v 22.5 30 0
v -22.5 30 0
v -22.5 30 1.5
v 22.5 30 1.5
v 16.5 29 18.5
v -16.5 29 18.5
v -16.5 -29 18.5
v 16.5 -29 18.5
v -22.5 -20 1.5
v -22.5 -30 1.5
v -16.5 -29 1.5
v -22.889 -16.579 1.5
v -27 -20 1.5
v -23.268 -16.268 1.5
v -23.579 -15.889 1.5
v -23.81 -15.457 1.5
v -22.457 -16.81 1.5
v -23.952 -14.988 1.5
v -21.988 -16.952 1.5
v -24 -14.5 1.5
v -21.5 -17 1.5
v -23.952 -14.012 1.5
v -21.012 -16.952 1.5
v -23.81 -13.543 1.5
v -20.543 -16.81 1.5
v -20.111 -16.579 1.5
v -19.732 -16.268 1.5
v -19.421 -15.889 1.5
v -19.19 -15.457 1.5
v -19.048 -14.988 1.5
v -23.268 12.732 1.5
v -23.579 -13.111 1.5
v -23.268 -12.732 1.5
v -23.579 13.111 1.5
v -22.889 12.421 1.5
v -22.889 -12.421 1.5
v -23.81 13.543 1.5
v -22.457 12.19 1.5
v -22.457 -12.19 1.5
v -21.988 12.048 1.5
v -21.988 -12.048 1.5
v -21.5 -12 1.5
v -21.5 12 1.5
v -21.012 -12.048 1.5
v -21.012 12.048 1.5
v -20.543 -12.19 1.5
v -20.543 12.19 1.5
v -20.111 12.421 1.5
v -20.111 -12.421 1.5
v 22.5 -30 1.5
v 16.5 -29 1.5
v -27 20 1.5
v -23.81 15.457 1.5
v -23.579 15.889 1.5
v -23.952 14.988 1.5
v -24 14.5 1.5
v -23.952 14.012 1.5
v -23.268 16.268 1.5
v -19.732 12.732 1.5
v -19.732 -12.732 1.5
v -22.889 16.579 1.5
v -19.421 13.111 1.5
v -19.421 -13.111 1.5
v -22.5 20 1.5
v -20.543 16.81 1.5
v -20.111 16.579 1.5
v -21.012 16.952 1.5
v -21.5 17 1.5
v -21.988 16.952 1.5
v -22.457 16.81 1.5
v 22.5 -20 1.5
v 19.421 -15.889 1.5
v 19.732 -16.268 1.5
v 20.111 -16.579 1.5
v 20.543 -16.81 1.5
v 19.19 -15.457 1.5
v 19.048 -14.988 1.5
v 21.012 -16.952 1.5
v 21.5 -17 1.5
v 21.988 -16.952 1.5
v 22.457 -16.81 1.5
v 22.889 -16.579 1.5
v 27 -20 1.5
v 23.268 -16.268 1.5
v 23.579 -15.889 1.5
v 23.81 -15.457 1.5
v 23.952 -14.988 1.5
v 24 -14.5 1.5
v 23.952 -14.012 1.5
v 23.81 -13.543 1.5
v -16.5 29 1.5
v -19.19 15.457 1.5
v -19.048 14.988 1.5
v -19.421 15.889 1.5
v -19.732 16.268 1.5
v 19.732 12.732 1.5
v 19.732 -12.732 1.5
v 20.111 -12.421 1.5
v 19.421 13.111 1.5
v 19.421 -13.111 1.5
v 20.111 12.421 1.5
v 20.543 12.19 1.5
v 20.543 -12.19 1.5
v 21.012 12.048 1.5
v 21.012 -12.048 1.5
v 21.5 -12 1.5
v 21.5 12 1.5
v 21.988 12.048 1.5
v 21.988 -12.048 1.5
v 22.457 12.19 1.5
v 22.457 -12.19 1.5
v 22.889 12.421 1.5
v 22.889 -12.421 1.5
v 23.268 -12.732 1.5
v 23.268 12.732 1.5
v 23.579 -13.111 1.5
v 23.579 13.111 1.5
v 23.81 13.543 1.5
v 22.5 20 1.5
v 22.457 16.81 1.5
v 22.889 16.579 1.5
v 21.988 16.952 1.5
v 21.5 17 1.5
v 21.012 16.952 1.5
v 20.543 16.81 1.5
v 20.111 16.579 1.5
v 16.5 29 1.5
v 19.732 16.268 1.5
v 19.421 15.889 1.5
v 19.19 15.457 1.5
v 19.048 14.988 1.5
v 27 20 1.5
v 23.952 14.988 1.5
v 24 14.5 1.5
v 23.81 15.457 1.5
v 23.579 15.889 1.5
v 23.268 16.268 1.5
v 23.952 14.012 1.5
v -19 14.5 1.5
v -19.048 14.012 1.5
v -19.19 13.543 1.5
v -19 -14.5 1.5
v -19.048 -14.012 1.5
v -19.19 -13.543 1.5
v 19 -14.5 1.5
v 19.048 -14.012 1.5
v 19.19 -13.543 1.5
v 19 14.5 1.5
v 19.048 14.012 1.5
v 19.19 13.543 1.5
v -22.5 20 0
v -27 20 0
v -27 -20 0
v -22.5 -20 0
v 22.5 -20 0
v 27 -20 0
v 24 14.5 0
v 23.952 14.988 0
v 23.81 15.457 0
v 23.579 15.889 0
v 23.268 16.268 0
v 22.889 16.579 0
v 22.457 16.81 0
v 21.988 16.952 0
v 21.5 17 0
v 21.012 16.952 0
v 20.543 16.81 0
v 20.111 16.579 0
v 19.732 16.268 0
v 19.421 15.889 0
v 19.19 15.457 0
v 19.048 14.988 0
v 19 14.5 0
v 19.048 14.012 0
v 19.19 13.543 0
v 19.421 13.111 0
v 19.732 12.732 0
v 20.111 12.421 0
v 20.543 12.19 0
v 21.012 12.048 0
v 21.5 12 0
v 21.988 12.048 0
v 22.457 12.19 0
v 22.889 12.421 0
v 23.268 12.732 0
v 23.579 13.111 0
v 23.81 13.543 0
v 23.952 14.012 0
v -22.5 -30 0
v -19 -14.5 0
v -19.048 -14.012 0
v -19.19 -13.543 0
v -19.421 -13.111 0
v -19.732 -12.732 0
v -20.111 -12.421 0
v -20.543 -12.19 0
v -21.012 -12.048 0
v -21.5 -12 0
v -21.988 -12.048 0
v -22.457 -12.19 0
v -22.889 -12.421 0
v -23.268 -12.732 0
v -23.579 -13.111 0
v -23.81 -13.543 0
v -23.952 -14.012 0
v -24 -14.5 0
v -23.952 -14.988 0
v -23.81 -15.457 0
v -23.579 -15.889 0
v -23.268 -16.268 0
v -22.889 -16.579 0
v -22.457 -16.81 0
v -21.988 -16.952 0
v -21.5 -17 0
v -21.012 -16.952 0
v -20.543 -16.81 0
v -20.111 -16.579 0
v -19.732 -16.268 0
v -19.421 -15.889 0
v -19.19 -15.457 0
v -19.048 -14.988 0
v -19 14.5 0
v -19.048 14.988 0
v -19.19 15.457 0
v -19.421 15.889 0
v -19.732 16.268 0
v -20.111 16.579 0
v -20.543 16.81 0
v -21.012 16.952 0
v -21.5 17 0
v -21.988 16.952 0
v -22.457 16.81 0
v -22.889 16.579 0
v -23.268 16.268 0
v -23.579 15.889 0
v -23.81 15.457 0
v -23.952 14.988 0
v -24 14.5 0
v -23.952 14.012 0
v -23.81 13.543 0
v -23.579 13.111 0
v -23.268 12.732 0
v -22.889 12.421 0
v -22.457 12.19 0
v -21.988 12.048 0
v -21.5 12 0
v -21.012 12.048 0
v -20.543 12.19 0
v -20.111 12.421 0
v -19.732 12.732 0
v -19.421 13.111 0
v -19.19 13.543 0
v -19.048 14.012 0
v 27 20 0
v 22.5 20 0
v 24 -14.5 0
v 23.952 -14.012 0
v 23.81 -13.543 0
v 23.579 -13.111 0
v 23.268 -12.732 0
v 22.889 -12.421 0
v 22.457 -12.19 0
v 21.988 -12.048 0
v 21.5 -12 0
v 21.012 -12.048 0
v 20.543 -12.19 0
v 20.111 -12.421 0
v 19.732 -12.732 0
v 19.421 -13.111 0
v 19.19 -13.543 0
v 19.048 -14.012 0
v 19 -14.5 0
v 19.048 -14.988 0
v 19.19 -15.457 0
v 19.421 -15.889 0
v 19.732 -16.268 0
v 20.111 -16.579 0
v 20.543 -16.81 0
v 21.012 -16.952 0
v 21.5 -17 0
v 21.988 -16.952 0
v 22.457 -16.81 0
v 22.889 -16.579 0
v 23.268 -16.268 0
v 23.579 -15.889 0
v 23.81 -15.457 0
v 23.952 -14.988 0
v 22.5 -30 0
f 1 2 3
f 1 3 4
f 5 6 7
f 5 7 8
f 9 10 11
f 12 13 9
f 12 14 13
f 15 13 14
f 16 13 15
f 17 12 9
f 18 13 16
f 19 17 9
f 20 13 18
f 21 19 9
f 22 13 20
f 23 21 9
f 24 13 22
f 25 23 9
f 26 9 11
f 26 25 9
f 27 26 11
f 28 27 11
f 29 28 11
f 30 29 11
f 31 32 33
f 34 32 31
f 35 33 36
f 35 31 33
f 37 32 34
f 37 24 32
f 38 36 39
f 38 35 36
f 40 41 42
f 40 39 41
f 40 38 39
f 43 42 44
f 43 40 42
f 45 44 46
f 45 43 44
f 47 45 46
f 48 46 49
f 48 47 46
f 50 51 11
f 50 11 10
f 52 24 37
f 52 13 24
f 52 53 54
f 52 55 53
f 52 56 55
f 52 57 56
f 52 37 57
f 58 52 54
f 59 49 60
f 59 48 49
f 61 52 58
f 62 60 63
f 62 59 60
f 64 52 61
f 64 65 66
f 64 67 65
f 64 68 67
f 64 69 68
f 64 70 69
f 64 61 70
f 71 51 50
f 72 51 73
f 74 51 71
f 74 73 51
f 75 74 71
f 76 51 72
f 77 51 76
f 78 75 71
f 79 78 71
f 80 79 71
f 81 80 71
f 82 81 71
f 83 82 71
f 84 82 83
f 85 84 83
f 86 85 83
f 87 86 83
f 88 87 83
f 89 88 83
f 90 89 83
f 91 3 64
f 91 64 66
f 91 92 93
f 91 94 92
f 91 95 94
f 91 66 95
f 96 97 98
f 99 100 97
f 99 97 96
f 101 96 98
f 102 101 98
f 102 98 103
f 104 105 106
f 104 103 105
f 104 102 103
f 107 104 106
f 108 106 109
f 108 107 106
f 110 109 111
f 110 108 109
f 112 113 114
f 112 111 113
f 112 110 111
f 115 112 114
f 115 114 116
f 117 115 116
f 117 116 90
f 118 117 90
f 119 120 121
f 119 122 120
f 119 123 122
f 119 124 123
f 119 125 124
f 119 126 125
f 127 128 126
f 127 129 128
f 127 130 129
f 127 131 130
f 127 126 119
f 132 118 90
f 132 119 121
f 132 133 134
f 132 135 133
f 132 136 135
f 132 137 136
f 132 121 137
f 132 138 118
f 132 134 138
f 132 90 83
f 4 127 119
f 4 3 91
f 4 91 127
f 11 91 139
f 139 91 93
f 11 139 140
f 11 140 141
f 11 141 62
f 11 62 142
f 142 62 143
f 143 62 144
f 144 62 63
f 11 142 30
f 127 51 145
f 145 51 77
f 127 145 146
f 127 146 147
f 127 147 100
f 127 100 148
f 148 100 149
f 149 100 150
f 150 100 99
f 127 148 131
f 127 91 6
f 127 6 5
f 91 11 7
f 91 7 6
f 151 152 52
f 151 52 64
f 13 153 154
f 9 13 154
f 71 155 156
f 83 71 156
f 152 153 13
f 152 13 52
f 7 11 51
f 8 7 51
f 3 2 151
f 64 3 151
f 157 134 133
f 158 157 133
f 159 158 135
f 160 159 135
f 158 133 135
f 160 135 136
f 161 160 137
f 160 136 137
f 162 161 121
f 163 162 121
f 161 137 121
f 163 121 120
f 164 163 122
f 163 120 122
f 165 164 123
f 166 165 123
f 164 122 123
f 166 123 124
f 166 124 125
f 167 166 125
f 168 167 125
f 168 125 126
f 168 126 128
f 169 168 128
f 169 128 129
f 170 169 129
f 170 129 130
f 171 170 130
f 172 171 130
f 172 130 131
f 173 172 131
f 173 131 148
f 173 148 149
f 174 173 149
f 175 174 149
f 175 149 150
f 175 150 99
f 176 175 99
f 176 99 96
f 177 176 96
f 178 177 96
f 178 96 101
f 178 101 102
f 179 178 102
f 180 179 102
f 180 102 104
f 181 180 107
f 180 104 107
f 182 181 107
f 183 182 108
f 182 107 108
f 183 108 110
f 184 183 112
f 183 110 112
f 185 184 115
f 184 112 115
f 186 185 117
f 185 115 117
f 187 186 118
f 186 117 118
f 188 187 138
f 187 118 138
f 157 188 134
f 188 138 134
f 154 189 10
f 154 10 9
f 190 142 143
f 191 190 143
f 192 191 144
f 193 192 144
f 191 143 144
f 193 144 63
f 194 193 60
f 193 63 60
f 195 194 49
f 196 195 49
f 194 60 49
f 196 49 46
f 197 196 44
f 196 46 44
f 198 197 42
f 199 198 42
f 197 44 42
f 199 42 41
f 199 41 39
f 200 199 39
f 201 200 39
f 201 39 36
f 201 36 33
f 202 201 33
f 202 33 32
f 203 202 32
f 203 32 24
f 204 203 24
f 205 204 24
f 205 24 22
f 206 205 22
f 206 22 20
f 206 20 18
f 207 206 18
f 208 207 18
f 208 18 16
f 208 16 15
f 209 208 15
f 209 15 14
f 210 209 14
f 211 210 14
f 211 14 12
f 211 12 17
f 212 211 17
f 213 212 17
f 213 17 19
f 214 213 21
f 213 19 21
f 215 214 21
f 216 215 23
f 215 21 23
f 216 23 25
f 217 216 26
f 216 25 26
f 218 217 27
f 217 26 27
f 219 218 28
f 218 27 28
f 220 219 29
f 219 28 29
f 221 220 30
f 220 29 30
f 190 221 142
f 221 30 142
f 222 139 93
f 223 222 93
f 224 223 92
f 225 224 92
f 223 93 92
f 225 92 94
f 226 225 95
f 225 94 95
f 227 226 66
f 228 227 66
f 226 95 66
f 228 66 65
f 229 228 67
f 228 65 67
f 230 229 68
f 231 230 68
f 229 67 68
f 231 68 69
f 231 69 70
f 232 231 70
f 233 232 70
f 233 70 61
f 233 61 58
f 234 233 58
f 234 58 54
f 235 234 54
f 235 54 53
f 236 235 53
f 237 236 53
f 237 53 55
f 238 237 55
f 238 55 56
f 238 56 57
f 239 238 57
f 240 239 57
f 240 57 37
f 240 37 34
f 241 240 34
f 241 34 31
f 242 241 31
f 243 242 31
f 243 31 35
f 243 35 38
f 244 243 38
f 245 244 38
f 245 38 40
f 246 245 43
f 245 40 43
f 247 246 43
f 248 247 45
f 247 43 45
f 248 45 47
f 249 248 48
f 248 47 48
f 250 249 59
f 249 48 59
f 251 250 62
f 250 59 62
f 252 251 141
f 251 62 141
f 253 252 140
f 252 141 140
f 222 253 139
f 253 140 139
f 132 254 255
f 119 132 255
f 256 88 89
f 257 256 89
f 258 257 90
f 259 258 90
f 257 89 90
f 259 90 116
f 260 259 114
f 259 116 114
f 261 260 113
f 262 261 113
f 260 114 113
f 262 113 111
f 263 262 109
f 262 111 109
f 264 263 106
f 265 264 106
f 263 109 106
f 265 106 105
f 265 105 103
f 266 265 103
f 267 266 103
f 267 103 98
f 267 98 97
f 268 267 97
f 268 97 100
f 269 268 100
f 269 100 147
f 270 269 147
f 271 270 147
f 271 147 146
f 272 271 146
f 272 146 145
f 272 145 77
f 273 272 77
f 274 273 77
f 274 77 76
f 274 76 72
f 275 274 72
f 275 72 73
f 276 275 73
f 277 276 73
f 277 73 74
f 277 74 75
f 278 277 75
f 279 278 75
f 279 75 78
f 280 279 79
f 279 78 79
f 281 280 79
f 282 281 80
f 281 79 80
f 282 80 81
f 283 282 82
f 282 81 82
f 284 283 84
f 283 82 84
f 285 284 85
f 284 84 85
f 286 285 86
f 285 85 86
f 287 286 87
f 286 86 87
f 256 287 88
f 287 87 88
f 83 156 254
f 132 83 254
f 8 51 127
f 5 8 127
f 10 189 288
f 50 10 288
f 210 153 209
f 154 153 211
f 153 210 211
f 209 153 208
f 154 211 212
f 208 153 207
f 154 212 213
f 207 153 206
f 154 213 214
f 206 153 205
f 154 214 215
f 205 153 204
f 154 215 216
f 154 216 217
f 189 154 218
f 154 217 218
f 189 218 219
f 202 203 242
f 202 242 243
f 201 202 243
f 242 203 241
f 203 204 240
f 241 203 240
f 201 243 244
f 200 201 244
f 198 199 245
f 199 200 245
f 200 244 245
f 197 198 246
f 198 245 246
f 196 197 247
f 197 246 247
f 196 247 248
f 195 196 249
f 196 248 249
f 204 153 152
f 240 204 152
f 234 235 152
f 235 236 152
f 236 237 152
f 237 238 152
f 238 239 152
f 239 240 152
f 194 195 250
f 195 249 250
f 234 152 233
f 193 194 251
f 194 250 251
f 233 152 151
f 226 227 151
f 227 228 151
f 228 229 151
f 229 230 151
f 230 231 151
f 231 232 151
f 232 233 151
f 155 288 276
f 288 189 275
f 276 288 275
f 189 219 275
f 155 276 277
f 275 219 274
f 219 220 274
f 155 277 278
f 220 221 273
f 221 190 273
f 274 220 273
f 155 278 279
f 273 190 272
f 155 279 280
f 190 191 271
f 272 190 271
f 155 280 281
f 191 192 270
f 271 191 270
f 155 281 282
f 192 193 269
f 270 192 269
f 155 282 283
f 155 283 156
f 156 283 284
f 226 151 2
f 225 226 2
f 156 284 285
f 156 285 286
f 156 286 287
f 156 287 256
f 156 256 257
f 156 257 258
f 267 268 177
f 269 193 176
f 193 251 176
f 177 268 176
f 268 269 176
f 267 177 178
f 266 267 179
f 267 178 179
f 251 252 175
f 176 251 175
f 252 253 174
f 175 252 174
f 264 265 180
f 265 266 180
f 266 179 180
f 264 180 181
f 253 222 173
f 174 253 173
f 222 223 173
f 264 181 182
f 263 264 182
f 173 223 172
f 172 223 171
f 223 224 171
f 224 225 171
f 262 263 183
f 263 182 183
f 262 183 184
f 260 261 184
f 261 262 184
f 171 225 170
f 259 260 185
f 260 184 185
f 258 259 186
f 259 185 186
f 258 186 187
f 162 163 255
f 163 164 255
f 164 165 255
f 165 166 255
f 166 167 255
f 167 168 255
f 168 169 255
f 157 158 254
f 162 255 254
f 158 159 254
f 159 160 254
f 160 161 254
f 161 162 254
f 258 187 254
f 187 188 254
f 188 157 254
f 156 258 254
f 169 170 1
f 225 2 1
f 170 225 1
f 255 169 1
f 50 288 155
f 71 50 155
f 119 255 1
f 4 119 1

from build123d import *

# Parameters (mm, degrees)
F0_W     = 4.5
F0_H     = 40
F0_W_2   = 45
F0_H_2   = 10
F1_DEPTH = 1.5
F2_R     = 2.5
F3_DEPTH = 25
F4_W     = 33
F4_H     = 58
F5_DEPTH = 17


with BuildPart() as f1:
    # F0 (on Top) → F1 (new body)
    with BuildSketch(Plane.XY):
        with Locations((24.75, 0)):
            Rectangle(F0_W, F0_H)
        Rectangle(F0_W_2, F0_H)
        with Locations((0, 25)):
            Rectangle(F0_W_2, F0_H_2)
        with Locations((-24.75, 0)):
            Rectangle(F0_W, F0_H)
        with Locations((0, -25)):
            Rectangle(F0_W_2, F0_H_2)
    extrude(amount=F1_DEPTH)

    # F2 (on face) → F3 (cut)
    with BuildSketch(Plane.XY.offset(1.5)):
        with Locations((-21.5, 14.5)):
            Circle(F2_R)
        with Locations((21.5, 14.5)):
            Circle(F2_R)
        with Locations((21.5, -14.5)):
            Circle(F2_R)
        with Locations((-21.5, -14.5)):
            Circle(F2_R)
    extrude(amount=-F3_DEPTH, mode=Mode.SUBTRACT)

    # F4 (on face) → F5 (join)
    with BuildSketch(Plane.XY.offset(1.5)):
        Rectangle(F4_W, F4_H)
    extrude(amount=F5_DEPTH)


solid = f1.part
